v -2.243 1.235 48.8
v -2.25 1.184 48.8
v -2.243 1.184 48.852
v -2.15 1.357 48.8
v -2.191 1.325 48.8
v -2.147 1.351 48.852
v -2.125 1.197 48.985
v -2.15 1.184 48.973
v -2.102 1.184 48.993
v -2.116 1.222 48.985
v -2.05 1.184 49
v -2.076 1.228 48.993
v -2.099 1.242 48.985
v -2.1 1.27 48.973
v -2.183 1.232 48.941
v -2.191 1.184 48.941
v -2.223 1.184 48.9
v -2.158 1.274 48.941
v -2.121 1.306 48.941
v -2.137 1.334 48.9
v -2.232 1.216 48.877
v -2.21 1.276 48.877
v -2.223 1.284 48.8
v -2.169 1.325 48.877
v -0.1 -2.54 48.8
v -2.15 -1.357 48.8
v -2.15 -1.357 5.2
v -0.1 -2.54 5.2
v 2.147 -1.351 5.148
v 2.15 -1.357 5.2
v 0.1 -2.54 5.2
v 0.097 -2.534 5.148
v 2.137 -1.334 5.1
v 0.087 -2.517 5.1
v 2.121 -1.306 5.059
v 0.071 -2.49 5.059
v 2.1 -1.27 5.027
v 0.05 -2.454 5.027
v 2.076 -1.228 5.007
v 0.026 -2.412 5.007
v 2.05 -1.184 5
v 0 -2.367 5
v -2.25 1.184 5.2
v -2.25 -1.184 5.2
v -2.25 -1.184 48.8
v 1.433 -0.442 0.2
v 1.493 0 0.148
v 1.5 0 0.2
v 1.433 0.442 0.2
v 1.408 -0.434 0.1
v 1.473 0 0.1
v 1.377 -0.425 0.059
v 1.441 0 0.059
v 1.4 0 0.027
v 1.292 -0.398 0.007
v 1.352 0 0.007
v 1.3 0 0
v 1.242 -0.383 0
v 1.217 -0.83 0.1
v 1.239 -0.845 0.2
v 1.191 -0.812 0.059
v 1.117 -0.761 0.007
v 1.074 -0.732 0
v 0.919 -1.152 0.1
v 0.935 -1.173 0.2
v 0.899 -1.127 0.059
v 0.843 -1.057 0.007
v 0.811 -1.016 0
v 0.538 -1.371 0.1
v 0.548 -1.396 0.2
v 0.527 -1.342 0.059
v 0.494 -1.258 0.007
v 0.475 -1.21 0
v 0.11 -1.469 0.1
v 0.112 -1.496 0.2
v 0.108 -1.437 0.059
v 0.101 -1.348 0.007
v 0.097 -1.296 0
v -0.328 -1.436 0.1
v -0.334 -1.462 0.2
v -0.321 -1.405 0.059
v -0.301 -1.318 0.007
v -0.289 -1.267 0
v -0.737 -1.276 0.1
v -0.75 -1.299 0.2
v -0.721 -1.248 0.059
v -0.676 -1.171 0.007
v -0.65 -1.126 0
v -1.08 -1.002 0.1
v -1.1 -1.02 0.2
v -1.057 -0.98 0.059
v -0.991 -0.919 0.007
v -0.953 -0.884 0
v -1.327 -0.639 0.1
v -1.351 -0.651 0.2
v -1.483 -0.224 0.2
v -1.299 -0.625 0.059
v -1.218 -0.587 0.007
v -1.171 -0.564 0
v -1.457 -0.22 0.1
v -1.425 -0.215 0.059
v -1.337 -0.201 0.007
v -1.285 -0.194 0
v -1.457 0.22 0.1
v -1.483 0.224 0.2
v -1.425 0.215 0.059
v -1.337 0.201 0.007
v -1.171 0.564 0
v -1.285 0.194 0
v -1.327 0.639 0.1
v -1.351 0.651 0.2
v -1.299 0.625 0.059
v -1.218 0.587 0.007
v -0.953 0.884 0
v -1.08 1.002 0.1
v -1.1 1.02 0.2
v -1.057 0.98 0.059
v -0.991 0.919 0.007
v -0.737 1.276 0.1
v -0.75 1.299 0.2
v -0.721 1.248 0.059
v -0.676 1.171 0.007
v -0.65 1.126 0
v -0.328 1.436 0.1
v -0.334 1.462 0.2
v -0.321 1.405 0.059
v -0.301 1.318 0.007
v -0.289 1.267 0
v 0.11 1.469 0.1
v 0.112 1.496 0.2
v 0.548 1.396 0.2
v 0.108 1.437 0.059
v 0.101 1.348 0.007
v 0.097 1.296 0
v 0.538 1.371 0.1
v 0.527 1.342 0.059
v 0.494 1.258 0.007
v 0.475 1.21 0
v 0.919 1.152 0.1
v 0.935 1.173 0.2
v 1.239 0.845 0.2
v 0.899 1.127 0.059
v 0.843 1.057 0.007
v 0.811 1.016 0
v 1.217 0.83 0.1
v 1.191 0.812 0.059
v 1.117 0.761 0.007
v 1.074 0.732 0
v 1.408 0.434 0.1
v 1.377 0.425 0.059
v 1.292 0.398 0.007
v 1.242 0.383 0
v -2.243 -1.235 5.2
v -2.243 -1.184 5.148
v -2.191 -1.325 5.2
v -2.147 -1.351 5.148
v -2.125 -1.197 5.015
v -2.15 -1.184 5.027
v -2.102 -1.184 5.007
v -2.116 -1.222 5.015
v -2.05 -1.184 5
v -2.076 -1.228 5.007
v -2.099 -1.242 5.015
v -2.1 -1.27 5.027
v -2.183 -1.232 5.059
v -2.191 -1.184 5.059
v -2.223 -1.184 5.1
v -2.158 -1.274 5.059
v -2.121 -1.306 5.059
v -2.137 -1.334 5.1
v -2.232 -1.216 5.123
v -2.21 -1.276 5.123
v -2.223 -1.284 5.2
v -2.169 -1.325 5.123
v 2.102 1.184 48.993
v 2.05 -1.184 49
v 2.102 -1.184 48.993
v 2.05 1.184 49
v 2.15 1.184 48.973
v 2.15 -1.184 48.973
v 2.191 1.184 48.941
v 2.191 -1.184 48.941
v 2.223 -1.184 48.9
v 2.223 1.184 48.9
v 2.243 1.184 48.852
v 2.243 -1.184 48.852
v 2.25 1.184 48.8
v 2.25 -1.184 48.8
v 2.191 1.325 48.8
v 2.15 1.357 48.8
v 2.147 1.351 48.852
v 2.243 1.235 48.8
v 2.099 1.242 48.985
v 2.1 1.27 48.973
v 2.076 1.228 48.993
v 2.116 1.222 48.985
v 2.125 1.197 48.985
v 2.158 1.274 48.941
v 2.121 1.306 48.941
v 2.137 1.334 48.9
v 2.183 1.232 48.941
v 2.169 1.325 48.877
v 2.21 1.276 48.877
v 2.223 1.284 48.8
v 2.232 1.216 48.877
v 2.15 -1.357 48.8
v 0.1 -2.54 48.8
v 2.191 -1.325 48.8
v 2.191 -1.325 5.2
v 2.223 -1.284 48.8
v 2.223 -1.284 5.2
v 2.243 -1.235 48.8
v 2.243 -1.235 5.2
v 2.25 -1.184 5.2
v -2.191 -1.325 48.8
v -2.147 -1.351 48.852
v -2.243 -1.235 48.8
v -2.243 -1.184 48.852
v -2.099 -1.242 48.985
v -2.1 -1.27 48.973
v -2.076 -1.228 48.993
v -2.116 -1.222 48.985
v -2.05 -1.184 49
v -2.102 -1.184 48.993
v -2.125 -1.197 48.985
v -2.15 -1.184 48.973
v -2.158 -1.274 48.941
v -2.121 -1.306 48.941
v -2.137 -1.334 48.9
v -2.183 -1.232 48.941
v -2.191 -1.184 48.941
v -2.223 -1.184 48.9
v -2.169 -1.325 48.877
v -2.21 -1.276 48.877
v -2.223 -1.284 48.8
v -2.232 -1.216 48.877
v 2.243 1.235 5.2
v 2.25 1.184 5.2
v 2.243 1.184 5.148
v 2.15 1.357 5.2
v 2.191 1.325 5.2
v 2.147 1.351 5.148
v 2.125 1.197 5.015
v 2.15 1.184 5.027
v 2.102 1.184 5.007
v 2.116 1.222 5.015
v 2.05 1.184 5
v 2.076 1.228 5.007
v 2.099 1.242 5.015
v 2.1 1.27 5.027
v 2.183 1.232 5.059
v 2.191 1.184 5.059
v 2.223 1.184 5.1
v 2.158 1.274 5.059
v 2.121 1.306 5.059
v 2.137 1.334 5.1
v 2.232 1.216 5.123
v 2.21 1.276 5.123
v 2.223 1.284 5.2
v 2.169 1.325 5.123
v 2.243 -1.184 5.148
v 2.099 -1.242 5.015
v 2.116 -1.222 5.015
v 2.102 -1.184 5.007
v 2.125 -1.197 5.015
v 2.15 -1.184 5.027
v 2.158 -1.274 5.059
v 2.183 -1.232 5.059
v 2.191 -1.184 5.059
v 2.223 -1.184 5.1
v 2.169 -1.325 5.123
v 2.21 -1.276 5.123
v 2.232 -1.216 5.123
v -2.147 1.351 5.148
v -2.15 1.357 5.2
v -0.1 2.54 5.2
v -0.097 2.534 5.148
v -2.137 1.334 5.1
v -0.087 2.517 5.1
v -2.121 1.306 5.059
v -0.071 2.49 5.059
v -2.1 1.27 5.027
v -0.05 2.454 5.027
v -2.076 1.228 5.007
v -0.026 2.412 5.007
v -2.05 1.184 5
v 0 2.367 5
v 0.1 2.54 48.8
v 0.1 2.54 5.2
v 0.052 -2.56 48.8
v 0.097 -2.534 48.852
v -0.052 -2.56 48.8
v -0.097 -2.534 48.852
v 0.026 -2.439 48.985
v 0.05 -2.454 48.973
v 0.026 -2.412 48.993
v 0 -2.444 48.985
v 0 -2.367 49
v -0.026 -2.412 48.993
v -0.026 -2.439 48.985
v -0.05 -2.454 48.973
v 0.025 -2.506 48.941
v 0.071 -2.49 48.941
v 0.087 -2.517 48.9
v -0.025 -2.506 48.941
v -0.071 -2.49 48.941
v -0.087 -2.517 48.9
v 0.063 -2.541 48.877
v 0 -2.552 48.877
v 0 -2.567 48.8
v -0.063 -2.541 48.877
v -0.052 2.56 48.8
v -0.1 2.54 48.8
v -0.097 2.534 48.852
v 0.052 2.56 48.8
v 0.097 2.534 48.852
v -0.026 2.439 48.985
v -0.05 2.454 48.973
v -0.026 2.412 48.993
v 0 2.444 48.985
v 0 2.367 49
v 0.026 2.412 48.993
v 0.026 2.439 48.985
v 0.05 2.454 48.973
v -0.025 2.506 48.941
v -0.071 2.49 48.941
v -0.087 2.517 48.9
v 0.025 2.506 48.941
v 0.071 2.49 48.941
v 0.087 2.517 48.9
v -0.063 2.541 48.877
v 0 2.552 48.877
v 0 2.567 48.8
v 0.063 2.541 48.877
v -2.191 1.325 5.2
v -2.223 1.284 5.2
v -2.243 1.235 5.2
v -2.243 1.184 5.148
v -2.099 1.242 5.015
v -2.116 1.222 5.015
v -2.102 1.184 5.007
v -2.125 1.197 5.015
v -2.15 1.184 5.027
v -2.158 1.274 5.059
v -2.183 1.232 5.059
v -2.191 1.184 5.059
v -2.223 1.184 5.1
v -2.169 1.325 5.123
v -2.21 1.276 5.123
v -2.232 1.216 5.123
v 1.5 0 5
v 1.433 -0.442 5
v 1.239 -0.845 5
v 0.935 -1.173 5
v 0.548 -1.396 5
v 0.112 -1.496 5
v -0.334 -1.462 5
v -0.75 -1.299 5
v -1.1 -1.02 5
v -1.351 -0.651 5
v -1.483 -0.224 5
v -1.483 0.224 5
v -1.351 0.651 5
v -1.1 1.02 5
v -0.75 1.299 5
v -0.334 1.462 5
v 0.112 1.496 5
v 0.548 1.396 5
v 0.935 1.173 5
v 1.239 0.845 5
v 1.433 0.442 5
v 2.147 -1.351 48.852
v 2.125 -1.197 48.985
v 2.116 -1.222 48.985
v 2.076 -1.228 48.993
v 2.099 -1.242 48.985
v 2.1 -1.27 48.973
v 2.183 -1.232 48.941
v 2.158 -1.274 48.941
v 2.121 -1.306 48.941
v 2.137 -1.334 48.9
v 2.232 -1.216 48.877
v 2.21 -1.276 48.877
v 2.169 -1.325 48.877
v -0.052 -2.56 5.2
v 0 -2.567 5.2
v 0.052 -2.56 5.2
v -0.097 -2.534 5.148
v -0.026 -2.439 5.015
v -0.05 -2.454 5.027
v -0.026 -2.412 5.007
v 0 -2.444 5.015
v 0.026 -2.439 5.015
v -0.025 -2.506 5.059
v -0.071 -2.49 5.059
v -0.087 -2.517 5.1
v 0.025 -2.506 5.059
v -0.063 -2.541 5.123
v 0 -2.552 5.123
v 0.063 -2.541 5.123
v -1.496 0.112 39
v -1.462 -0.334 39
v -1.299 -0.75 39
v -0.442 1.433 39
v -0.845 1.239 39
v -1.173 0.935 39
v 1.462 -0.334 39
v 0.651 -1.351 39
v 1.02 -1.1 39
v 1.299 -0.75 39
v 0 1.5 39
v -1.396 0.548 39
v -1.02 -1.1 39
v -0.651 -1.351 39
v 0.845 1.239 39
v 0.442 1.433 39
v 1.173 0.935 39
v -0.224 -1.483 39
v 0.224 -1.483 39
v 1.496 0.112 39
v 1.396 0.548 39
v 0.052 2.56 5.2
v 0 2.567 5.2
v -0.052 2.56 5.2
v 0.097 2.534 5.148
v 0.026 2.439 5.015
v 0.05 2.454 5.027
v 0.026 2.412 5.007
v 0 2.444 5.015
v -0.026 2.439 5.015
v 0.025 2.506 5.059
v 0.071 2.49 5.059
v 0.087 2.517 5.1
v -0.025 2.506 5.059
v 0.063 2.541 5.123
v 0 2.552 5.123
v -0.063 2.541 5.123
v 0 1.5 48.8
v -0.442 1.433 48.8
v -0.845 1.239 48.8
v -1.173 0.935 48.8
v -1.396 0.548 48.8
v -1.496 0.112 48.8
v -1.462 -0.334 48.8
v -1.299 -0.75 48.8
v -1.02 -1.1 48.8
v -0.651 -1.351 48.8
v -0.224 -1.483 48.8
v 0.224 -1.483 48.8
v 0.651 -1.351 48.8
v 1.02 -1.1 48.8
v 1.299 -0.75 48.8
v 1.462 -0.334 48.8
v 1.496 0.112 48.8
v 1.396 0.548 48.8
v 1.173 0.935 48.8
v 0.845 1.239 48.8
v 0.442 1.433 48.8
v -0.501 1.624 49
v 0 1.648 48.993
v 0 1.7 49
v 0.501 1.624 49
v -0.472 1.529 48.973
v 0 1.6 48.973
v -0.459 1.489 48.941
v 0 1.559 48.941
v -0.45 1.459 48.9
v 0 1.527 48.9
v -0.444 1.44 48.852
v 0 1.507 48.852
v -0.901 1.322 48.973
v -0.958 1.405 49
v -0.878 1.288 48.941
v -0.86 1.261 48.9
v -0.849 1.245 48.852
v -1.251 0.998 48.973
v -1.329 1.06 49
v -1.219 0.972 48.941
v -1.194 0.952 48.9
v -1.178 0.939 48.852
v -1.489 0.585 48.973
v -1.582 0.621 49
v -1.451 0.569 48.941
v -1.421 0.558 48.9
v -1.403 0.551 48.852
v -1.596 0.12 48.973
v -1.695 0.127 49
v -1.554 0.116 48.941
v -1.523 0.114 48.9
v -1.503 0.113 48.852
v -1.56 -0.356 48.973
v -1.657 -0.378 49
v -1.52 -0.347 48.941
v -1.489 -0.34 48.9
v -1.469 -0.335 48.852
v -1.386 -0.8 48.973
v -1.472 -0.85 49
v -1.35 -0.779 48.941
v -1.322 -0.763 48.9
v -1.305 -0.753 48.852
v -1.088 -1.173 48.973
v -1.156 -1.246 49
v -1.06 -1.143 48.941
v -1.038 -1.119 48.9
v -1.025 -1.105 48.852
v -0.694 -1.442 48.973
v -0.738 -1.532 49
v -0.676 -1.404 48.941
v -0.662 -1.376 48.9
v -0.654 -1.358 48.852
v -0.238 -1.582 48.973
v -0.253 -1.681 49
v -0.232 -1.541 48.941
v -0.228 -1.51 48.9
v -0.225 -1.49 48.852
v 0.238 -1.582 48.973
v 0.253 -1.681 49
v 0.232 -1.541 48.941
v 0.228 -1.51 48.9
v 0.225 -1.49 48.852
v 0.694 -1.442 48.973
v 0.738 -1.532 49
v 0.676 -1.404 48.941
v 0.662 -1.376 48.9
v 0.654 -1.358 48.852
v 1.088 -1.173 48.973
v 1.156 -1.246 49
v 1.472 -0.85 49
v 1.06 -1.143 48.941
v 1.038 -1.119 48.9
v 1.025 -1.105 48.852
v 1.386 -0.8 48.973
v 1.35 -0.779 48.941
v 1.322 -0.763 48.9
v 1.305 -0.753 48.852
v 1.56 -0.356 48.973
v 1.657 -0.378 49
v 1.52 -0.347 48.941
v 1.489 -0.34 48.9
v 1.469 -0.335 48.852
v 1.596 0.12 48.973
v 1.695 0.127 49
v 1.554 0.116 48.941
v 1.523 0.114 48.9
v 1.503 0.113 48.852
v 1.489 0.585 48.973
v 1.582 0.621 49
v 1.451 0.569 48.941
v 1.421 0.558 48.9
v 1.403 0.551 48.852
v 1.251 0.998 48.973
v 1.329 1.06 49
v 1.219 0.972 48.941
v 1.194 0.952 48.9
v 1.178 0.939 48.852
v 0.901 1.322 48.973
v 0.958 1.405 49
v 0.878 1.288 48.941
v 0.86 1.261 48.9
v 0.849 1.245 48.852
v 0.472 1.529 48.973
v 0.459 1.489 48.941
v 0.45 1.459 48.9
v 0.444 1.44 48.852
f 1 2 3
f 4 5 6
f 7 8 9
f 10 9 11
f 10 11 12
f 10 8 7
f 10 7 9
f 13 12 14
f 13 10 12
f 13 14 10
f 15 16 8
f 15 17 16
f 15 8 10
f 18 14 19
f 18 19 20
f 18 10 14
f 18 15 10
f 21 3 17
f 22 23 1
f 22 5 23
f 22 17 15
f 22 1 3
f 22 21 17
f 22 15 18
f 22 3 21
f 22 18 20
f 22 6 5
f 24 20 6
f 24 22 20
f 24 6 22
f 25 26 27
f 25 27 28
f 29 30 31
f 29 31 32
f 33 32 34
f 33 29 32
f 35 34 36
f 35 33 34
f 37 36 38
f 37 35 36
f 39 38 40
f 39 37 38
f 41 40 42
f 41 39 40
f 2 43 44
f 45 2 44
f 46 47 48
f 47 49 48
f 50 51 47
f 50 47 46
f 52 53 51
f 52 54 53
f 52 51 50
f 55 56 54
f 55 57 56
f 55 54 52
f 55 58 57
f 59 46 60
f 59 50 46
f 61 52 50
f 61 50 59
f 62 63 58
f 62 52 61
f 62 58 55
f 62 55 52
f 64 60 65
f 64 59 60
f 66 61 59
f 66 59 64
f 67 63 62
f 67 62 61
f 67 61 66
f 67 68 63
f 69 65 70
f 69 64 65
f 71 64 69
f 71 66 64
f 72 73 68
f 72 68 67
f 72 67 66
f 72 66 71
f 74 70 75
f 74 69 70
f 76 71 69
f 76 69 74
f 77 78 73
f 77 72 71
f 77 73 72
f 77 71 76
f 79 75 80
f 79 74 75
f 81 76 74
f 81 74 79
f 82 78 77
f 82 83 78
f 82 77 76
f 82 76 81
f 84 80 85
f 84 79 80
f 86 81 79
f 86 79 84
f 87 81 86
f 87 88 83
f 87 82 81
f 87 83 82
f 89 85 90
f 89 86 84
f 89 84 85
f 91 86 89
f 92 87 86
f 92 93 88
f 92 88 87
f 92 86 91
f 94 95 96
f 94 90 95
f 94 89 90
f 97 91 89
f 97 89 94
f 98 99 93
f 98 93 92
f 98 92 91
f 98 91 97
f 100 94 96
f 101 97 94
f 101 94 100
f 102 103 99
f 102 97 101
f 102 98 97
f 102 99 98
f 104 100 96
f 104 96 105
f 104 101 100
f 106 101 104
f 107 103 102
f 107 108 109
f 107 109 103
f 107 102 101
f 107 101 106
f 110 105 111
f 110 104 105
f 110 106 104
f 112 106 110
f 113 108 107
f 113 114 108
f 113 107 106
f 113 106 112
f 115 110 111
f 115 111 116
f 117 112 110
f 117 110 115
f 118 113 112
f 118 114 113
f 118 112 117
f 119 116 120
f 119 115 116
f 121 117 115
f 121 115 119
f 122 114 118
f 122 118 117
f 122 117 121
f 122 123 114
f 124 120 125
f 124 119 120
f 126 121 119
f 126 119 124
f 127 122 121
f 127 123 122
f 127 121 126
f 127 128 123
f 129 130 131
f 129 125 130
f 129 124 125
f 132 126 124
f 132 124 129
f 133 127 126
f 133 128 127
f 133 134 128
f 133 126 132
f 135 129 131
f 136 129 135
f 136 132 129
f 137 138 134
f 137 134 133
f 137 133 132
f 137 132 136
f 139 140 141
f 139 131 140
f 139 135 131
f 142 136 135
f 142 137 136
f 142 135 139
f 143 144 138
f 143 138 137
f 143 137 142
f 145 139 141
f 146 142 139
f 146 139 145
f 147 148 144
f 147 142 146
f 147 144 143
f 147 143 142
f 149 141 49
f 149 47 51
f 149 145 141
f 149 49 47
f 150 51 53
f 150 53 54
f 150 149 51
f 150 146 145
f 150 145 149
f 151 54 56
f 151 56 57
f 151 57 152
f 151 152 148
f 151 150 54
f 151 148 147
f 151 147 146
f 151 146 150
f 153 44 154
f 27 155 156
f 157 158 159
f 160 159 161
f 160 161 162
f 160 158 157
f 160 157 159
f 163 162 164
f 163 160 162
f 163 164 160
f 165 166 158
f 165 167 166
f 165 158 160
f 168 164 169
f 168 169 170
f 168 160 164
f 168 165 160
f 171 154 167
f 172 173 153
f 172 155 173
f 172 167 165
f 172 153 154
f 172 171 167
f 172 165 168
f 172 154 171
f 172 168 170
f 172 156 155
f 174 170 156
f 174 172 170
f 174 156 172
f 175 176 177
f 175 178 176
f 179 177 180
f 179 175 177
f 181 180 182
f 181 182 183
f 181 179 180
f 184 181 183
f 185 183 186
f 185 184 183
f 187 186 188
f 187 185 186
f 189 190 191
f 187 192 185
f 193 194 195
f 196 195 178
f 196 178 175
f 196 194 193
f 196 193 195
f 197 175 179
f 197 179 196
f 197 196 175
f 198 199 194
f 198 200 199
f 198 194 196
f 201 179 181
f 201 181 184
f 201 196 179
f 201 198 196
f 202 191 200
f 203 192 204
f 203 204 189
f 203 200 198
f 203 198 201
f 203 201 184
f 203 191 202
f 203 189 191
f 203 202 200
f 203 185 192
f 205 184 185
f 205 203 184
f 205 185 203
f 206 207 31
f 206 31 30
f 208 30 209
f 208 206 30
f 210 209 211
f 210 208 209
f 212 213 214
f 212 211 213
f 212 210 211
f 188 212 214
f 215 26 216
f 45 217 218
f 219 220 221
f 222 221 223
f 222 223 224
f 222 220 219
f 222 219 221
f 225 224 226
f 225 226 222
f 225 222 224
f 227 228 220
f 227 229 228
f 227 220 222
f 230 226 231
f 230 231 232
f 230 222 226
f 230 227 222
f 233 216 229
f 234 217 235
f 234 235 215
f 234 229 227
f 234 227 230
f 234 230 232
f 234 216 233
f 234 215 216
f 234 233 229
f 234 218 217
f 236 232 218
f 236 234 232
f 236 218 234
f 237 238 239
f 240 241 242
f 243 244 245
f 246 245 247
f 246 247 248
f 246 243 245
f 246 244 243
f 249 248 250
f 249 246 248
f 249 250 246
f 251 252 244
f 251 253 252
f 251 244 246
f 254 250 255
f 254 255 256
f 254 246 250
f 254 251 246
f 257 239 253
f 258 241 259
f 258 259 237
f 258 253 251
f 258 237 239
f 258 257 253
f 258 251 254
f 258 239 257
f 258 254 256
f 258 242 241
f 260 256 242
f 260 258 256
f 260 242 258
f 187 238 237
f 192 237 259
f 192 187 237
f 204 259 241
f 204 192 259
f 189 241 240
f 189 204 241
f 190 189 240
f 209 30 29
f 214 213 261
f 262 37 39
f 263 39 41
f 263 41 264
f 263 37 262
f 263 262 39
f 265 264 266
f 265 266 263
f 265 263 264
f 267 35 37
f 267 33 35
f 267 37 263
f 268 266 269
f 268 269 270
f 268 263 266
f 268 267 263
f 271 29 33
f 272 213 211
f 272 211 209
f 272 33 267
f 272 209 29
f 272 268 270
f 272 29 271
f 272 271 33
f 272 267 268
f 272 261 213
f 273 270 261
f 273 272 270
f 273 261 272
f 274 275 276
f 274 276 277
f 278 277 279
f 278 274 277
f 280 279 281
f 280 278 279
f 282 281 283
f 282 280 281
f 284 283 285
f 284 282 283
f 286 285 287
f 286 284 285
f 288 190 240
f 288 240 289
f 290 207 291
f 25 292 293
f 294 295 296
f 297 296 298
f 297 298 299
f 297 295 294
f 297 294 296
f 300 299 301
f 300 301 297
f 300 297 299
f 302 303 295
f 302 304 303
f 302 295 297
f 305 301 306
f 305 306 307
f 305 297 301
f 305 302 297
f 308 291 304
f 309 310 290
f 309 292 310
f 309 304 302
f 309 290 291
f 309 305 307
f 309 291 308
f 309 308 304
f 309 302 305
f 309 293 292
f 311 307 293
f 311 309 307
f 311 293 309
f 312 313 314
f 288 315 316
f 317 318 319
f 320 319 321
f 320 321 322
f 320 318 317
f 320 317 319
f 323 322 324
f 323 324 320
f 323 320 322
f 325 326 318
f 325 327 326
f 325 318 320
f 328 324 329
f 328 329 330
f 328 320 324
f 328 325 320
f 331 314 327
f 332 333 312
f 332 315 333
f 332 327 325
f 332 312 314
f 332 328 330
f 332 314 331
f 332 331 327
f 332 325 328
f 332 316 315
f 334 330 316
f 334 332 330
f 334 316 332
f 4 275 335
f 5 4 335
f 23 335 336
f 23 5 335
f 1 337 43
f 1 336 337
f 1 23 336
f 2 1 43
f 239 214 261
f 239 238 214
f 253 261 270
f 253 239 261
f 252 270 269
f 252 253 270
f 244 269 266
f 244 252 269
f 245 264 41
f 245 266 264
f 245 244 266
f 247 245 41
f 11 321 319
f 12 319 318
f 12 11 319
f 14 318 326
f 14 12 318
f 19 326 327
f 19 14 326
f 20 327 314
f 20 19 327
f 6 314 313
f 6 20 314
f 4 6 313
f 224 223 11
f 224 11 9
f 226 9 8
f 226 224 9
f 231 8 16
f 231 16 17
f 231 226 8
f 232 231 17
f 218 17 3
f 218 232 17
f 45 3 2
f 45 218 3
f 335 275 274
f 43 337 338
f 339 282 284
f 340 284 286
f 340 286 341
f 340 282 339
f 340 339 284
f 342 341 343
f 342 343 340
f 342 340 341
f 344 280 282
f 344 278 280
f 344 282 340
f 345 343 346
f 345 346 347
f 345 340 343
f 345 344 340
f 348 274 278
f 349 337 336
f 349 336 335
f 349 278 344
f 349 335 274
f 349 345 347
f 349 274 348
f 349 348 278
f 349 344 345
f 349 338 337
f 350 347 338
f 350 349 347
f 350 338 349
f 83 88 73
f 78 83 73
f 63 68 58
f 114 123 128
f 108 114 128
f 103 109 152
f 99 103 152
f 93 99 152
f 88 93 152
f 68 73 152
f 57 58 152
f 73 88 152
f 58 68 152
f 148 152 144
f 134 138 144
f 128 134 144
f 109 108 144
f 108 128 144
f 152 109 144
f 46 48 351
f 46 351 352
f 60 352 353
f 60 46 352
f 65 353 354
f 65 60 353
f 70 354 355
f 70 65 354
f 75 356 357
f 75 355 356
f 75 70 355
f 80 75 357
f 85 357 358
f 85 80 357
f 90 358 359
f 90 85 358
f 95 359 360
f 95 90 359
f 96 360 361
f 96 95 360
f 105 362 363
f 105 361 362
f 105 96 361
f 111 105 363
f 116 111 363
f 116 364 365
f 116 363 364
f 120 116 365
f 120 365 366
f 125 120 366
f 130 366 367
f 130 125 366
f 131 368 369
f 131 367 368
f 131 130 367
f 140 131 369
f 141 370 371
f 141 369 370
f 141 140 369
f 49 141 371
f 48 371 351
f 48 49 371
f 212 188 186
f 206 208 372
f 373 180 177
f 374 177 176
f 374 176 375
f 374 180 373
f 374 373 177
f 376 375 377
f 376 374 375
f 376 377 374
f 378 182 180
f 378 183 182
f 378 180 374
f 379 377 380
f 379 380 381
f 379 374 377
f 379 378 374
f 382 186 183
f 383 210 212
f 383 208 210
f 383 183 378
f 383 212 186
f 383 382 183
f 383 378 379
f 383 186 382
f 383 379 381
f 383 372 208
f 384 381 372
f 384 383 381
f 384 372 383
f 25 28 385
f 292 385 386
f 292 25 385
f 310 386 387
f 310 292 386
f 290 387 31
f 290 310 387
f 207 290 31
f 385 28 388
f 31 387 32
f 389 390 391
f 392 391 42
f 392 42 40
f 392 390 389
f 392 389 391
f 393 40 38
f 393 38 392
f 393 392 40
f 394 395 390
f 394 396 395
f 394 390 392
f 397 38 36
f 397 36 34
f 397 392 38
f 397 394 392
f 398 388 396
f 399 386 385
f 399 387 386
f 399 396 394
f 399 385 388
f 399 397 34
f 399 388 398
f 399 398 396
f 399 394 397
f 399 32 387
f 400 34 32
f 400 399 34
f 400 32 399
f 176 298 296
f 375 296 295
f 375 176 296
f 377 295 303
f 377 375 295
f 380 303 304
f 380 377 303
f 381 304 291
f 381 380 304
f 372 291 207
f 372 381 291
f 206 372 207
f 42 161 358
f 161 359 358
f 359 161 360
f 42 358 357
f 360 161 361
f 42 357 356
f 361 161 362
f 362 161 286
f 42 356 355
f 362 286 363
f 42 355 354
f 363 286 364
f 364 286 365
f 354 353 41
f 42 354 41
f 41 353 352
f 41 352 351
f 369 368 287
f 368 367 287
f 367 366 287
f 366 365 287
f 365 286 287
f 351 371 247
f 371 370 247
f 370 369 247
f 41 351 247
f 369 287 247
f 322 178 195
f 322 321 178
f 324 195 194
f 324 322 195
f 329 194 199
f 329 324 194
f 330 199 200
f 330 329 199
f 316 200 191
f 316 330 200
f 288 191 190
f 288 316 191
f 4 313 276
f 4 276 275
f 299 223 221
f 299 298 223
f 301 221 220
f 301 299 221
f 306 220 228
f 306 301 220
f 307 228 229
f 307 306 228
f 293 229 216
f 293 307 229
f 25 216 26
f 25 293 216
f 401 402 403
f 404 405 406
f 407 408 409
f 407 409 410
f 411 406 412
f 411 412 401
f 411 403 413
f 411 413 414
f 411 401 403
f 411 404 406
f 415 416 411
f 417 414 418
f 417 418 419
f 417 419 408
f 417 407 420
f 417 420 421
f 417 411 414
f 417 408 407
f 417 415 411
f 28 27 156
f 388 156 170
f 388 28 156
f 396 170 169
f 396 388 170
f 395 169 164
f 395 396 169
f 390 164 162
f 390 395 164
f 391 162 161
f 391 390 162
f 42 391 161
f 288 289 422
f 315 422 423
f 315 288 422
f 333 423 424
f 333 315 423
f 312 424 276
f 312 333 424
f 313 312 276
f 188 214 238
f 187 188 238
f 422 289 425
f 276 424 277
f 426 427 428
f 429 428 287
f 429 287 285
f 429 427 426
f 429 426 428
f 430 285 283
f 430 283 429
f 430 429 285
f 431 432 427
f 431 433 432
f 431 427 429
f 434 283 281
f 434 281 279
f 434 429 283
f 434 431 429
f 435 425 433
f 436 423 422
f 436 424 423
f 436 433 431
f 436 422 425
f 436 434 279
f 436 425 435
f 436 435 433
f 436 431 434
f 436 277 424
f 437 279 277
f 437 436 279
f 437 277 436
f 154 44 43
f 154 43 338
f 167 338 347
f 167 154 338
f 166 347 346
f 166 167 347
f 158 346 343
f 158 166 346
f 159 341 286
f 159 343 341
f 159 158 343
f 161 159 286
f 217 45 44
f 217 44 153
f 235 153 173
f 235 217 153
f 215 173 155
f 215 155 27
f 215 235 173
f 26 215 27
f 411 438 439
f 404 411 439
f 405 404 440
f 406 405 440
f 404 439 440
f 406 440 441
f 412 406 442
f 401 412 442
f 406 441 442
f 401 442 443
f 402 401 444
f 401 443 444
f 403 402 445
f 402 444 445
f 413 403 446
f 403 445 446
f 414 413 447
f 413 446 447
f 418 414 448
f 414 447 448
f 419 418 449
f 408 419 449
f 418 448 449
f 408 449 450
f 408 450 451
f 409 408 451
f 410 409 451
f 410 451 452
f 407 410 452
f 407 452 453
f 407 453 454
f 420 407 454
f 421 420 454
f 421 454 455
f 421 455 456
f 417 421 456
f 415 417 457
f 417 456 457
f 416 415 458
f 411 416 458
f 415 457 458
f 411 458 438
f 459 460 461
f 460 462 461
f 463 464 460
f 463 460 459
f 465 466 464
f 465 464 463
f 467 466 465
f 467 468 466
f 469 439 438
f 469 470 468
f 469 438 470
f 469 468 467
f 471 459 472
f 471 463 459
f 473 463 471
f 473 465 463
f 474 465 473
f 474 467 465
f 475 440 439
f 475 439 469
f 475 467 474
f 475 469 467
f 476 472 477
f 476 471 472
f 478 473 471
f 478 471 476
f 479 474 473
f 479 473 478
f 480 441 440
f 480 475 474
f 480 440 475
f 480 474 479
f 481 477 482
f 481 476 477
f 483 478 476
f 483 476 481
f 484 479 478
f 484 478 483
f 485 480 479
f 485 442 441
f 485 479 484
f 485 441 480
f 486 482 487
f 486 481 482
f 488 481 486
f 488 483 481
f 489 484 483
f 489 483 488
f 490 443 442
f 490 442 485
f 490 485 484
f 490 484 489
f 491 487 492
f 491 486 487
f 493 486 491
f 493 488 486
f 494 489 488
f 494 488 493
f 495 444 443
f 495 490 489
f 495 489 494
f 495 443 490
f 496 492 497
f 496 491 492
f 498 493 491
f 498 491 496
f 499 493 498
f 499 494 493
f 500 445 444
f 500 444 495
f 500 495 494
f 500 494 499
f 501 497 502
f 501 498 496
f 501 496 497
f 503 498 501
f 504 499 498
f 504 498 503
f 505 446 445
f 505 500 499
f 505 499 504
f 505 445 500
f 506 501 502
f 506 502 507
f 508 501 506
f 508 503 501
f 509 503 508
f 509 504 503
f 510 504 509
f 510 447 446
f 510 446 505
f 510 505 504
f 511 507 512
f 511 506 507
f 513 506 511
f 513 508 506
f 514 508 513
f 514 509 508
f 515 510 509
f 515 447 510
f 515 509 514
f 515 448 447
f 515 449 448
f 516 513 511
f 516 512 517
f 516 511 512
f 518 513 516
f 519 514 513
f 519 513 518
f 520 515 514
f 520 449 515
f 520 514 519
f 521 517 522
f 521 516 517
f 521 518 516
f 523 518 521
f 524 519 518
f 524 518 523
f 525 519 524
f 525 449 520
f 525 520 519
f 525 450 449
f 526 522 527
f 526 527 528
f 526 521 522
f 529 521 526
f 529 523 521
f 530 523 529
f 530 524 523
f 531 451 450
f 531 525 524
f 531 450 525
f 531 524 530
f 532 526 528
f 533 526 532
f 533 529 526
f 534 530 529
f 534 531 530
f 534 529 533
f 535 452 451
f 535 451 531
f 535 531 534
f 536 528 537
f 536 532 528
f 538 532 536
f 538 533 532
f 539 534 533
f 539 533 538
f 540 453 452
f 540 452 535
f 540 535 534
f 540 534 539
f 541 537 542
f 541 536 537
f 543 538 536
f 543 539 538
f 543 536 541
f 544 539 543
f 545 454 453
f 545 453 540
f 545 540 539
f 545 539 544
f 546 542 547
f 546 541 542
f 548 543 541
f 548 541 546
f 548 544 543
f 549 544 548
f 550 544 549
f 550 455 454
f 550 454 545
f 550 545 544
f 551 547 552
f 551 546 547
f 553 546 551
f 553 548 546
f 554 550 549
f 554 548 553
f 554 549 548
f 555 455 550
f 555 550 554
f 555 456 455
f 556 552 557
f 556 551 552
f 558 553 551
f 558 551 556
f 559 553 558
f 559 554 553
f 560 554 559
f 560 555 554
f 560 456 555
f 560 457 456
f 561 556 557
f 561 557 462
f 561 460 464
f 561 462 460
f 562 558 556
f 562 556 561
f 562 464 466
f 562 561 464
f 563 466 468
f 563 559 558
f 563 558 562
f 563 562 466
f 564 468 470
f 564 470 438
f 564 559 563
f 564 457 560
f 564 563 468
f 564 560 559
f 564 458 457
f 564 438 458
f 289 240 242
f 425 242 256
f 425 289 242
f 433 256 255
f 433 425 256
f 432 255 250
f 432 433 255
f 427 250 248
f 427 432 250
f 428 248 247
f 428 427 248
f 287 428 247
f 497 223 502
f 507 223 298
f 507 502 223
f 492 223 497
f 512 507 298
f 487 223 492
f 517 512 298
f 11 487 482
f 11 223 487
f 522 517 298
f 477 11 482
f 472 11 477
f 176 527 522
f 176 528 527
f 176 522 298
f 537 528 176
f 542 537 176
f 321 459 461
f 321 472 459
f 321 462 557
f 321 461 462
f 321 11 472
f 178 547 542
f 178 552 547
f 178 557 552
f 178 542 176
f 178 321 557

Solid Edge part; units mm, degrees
sketch "Sketch1" plane through (0, 0, 0) normal (0, 0, 1) x (1, 0, 0)
  circle A0 centre (0, 0) radius 1.5
extrude "Protrusion1" add sketch "Sketch1" along normal blind 5
sketch "Sketch2" plane through (0, 0, 5) normal (0, 0, 1) x (1, 0, 0)
  line L0 (2.25, 1.299) -> (0, 2.5981)
  line L1 (0, 2.5981) -> (-2.25, 1.299)
  line L2 (-2.25, 1.299) -> (-2.25, -1.299)
  line L3 (-2.25, -1.299) -> (0, -2.5981)
  line L4 (0, -2.5981) -> (2.25, -1.299)
  line L5 (2.25, -1.299) -> (2.25, 1.299)
extrude "ExtrudedProtrusion_2" add sketch "Sketch2" along normal blind 44
sketch "Sketch3" plane through (0, 0, 49) normal (0, 0, 1) x (0, 1, 0)
  circle A0 centre (0, 0) radius 1.5
extrude "ExtrudedCutout_1" cut sketch "Sketch3" against normal blind 10
fillet "Round_1" radius 0.2 20 edges at (2.25, -1.299, 27) (2.25, 1.299, 27) (2.25, 0, 49) (1.125, 1.9486, 49) (0, -1.5, 49) (0, 2.5981, 27) (1.125, 1.9486, 5) (2.25, 0, 5) (1.125, -1.9486, 5) (0, -2.5981, 27) (1.125, -1.9486, 49) (-1.125, -1.9486, 49) (-1.125, -1.9486, 5) (-2.25, -1.299, 27) (-2.25, 0, 49) (-1.125, 1.9486, 49) (-2.25, 1.299, 27) (-2.25, 0, 5) (-1.125, 1.9486, 5) (-1.5, 0, 0)
properties material "Brass, yellow brass"
